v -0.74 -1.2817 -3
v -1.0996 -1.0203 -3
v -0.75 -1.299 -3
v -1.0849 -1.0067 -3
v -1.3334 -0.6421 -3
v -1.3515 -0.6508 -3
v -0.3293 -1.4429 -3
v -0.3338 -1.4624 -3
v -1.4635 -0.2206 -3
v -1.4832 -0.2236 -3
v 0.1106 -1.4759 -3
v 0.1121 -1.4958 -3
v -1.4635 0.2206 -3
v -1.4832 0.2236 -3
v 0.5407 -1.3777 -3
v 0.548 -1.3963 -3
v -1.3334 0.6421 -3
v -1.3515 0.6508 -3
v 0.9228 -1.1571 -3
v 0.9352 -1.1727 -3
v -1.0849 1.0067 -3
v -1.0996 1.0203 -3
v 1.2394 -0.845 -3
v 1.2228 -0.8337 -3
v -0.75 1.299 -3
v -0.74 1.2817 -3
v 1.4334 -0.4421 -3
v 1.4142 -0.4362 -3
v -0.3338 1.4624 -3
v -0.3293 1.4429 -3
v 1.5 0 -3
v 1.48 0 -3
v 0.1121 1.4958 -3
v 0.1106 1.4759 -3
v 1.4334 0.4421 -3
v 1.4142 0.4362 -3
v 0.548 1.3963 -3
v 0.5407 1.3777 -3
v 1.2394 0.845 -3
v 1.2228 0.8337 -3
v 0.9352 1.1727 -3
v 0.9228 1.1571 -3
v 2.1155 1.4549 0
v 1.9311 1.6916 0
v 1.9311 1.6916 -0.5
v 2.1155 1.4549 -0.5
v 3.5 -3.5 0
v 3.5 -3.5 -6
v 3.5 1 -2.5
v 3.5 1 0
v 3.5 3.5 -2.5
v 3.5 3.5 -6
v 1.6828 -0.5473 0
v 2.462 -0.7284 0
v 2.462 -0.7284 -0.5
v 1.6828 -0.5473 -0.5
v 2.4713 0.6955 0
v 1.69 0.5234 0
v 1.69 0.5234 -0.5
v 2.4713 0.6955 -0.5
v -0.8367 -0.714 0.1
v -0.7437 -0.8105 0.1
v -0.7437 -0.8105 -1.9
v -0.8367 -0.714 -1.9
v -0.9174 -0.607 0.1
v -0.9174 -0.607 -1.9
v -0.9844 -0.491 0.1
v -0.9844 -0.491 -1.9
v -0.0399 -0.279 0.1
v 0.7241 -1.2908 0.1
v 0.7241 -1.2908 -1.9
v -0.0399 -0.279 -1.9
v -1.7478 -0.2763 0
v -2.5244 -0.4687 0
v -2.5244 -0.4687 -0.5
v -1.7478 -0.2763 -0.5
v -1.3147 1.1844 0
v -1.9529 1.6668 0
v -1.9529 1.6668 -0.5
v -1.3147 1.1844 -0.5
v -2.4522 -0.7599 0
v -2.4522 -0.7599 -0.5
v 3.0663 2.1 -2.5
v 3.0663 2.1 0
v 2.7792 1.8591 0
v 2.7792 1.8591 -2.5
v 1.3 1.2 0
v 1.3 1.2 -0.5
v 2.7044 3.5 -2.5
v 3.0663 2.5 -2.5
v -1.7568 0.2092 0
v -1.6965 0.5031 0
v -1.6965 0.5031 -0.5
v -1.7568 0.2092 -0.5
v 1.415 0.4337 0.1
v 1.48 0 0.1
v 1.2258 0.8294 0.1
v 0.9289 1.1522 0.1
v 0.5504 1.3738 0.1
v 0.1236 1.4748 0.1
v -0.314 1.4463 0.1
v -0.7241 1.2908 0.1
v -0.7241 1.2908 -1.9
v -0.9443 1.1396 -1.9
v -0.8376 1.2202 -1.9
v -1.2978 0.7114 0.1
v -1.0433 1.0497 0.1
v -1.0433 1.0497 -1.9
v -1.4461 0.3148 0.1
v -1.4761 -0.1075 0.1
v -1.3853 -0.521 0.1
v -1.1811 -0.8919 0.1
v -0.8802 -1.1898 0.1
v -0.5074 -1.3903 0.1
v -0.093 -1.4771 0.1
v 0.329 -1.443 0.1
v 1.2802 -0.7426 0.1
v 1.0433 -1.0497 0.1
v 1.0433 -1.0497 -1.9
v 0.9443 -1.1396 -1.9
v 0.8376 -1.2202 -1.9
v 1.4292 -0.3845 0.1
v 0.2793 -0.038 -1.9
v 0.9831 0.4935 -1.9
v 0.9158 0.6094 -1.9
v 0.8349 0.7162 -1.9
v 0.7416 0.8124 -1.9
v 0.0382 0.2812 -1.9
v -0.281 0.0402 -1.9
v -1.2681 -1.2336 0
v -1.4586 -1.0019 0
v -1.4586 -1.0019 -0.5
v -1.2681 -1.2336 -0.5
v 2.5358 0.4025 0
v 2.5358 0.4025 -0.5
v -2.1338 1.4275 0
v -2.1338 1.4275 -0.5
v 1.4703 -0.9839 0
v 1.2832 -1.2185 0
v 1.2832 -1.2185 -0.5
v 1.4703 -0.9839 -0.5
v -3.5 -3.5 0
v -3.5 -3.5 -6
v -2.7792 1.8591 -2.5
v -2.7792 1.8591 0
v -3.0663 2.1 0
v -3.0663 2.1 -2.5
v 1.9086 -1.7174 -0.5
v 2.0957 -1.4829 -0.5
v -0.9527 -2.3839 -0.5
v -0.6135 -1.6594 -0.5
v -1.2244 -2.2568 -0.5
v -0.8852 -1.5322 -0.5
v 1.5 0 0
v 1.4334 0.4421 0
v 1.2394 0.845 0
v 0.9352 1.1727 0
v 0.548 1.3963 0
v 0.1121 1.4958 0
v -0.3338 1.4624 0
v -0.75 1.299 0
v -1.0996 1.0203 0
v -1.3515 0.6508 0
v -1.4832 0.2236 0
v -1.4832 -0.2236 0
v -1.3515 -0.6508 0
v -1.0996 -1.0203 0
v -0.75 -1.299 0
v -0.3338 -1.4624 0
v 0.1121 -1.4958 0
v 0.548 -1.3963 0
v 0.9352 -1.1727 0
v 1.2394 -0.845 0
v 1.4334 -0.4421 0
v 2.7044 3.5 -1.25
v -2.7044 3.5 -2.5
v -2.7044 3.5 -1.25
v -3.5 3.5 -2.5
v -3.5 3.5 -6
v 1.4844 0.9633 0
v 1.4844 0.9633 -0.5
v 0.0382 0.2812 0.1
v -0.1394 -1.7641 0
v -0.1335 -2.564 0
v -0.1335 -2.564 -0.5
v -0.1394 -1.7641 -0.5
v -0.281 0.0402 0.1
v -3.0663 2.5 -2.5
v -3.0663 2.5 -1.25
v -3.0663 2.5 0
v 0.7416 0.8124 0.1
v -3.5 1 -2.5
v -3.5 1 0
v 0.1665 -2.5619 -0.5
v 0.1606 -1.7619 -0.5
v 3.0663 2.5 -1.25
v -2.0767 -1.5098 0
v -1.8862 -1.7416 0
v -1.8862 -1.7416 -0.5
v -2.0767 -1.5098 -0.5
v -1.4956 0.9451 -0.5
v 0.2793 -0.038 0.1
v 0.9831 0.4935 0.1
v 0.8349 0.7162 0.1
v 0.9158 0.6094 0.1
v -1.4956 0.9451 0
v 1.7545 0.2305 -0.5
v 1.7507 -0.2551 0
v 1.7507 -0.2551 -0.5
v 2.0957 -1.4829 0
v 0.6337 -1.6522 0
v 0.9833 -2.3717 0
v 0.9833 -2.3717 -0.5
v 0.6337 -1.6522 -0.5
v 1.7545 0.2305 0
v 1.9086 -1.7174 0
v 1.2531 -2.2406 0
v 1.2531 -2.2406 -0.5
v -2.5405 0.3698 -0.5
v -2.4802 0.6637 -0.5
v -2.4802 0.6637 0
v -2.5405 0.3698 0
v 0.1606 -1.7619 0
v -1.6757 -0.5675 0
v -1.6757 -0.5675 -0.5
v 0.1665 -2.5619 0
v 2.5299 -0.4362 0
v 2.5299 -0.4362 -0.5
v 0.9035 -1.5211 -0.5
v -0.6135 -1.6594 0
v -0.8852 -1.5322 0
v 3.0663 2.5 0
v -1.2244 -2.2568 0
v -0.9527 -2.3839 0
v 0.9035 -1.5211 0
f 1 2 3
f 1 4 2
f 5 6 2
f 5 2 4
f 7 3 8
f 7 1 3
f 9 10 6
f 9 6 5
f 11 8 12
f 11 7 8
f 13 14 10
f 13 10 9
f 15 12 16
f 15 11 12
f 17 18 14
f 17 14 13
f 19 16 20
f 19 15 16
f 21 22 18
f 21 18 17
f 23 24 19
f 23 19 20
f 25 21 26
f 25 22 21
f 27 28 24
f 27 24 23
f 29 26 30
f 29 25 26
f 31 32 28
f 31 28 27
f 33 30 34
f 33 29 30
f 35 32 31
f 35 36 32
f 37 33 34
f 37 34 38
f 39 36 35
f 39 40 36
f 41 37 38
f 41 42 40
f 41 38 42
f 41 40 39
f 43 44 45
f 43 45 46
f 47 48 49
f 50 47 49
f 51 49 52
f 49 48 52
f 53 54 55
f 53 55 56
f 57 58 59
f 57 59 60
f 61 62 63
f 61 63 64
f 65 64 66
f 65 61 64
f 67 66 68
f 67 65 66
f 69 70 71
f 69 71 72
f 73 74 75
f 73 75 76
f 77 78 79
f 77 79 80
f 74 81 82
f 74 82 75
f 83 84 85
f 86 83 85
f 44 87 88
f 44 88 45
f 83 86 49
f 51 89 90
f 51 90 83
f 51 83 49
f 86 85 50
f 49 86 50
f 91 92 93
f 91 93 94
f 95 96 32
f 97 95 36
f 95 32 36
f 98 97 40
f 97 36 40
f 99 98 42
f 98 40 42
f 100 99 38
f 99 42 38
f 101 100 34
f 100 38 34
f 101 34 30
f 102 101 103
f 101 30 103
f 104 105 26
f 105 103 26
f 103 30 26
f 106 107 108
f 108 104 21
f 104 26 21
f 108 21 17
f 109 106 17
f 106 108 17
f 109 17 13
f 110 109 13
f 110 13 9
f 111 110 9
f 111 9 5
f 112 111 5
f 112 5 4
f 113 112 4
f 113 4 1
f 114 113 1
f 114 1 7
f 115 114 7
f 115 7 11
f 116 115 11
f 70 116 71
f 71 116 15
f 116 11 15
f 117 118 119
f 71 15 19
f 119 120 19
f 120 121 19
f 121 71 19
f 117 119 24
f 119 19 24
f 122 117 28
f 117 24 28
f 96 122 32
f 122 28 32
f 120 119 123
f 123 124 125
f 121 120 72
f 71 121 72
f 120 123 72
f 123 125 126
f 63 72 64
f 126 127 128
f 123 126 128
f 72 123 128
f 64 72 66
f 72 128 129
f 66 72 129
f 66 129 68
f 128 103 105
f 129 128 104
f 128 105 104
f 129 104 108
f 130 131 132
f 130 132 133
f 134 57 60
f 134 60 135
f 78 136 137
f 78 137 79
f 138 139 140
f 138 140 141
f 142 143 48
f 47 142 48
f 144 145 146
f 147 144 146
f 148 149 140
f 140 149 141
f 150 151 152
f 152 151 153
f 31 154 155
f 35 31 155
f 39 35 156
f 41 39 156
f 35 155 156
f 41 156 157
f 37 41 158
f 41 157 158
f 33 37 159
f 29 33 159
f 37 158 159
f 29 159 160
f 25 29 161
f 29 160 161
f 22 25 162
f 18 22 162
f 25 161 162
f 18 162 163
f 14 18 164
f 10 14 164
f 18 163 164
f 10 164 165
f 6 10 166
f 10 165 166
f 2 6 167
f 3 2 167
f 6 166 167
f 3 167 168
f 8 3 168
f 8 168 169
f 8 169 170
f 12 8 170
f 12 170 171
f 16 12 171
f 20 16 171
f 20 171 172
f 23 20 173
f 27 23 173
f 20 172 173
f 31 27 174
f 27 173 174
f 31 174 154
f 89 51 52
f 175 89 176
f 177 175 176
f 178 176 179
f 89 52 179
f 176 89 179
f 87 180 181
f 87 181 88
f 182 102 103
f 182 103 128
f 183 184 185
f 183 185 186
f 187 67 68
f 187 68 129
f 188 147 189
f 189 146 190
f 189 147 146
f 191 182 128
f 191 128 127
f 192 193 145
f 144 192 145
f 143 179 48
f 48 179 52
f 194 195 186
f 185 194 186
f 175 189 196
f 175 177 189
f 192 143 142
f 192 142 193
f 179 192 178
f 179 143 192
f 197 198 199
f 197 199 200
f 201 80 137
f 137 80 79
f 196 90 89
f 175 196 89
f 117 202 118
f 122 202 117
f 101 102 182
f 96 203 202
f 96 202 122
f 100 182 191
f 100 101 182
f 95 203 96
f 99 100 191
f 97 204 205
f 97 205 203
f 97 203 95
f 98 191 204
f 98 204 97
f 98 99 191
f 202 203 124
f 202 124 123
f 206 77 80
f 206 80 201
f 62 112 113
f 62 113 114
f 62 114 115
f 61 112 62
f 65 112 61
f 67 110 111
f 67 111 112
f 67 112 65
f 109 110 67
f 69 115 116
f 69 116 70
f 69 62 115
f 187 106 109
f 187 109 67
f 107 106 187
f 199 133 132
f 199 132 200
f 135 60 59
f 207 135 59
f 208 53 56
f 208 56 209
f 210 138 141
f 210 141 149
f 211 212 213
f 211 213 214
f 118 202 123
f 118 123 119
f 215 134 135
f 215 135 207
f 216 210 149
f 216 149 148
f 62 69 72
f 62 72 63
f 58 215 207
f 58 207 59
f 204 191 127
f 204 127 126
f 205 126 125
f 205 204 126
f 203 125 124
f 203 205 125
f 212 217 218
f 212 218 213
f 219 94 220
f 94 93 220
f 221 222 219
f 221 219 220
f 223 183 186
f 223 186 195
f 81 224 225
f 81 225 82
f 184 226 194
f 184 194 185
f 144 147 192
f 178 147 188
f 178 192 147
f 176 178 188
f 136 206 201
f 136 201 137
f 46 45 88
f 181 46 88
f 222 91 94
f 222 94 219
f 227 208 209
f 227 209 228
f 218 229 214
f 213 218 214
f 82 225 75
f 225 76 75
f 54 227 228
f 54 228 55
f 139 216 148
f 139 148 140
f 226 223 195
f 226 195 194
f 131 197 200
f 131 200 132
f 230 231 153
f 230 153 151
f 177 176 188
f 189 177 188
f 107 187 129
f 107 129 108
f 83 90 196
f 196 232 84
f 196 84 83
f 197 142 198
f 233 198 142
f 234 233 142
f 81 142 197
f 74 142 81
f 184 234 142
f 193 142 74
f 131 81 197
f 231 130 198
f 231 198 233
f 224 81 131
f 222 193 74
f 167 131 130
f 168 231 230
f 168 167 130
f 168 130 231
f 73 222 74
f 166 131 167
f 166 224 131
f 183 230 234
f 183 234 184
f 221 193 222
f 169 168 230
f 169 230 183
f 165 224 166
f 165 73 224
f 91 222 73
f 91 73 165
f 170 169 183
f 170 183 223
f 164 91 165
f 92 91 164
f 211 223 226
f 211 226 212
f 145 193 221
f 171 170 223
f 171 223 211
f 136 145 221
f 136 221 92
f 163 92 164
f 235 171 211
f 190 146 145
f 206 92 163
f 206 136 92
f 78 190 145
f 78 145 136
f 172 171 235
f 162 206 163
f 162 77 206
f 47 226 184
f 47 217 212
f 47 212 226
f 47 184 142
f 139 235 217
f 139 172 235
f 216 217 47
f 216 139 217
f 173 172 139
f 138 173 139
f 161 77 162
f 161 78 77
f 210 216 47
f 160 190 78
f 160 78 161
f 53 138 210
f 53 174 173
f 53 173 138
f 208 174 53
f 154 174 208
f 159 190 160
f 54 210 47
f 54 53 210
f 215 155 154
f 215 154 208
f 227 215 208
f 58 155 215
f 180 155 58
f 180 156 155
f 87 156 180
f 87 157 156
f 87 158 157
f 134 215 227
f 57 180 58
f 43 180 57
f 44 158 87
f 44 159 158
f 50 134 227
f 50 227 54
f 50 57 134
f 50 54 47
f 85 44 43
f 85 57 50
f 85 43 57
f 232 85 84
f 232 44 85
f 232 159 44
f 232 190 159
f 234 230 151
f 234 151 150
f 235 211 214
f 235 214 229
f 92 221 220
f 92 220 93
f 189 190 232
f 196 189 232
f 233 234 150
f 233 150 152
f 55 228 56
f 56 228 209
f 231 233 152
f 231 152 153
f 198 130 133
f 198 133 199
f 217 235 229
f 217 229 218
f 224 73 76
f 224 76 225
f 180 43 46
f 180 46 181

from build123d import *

# Parameters (mm, degrees)
BASE_EXTRUDE_START  = -6
SKETCH1_W           = 7
SKETCH1_H           = 7
BASE_EXTRUDE_DEPTH  = 6
SKETCH2_R           = 1.5
CUT_EXTRUDE1_DEPTH  = 3
SKETCH3_R           = 1.48
BOSS_EXTRUDE1_DEPTH = 3.1
CUT_EXTRUDE2_DEPTH  = 2
CUT_EXTRUDE3_DEPTH  = 0.5
CUT_EXTRUDE4_DEPTH  = 2.5
BOSS_EXTRUDE2_DEPTH = 1.25


with BuildPart() as part:
    # Sketch1 → Base-Extrude (new body)
    with BuildSketch(Plane.XY.offset(BASE_EXTRUDE_START)):
        Rectangle(SKETCH1_W, SKETCH1_H)
    extrude(amount=BASE_EXTRUDE_DEPTH)

    # Sketch2 → Cut-Extrude1 (cut)
    with BuildSketch(Plane.XY):
        Circle(SKETCH2_R)
    extrude(amount=-CUT_EXTRUDE1_DEPTH, mode=Mode.SUBTRACT)

    # Sketch3 → Boss-Extrude1 (add)
    with BuildSketch(Plane.XY.offset(-3)):
        Circle(SKETCH3_R)
    extrude(amount=BOSS_EXTRUDE1_DEPTH)

    # Sketch4 → Cut-Extrude2 (cut)
    with BuildSketch(Plane.XY.offset(0.1)):
        with BuildLine():
            Line((0.724096874, -1.290768654), (-0.039924426, -0.279012083))
            Line((-0.039924426, -0.279012083), (-0.743721804, -0.81048003))
            ThreePointArc((-0.743721804, -0.81048003), (-0.87868568, -0.661748801), (-0.984357933, -0.490957696))
            Line((-0.984357933, -0.490957696), (-0.280973901, 0.040198115))
            Line((-0.280973901, 0.040198115), (-1.043307072, 1.049719178))
            ThreePointArc((-1.043307072, 1.049719178), (-0.891883058, 1.181077733), (-0.724096874, 1.290768654))
            Line((-0.724096874, 1.290768654), (0.038236297, 0.28124759))
            Line((0.038236297, 0.28124759), (0.741620329, 0.812403402))
            ThreePointArc((0.741620329, 0.812403402), (0.876968937, 0.664022201), (0.98308315, 0.493505339))
            Line((0.98308315, 0.493505339), (0.279285772, -0.037962608))
            Line((0.279285772, -0.037962608), (1.043307072, -1.049719178))
            ThreePointArc((1.043307072, -1.049719178), (0.891883058, -1.181077733), (0.724096874, -1.290768654))
        make_face()
    extrude(amount=-CUT_EXTRUDE2_DEPTH, mode=Mode.SUBTRACT)

    # Sketch5 → Cut-Extrude3 (cut)
    with BuildSketch(Plane.XY):
        Polygon((1.3, 1.2), (1.931123884, 1.691612289), (2.115478493, 1.454940832), (1.484354608, 0.963328543), align=None)
        Polygon((1.689974186, 0.523437915), (2.471261862, 0.695454097), (2.53576793, 0.402471219), (1.754480254, 0.230455037), align=None)
        Polygon((1.750691662, -0.255105281), (2.529925297, -0.436199021), (2.462015144, -0.728411634), (1.68278151, -0.547317894), align=None)
        Polygon((1.470322877, -0.98394646), (2.095684825, -1.482867731), (1.908589348, -1.717378462), (1.283227401, -1.21845719), align=None)
        Polygon((0.903491923, -1.52108591), (1.25314327, -2.240630165), (0.983314174, -2.371749421), (0.633662827, -1.652205165), align=None)
        Polygon((0.160634151, -1.761873057), (0.166452524, -2.561851898), (-0.133539541, -2.564033789), (-0.139357915, -1.764054947), align=None)
        Polygon((-0.613519882, -1.659395479), (-0.952668072, -2.383949483), (-1.224375823, -2.256768912), (-0.885227633, -1.532214907), align=None)
        Polygon((-1.268142184, -1.233618823), (-1.886180889, -1.741583546), (-2.07666766, -1.509819032), (-1.458628956, -1.001854309), align=None)
        Polygon((-1.675693067, -0.567496913), (-2.452210156, -0.759905877), (-2.524363518, -0.468711968), (-1.747846428, -0.276303004), align=None)
        Polygon((-1.756769622, 0.209190097), (-2.540476714, 0.369823822), (-2.480239067, 0.663713982), (-1.696531975, 0.503080257), align=None)
        Polygon((-1.49557575, 0.94512072), (-2.133783638, 1.427500956), (-1.952891049, 1.666828914), (-1.314683162, 1.184448678), align=None)
    extrude(amount=-CUT_EXTRUDE3_DEPTH, mode=Mode.SUBTRACT)

    # Sketch7 → Cut-Extrude4 (cut)
    with BuildSketch(Plane.XY):
        Polygon((3.5, 3.5), (-3.5, 3.5), (-3.5, 1), (-2.779166508, 1.859055904), (-3.066312501, 2.1), (-3.066312501, 2.5), (3.066312501, 2.5), (3.066312501, 2.1), (2.779166508, 1.859055904), (3.5, 1), align=None)
    extrude(amount=-CUT_EXTRUDE4_DEPTH, mode=Mode.SUBTRACT)

    # Sketch8 → Boss-Extrude2 (add)
    with BuildSketch(Plane.XY.offset(-2.5)):
        Polygon((-3.066312501, 2.5), (3.066312501, 2.5), (2.70444426, 3.5), (-2.70444426, 3.5), align=None)
    extrude(amount=BOSS_EXTRUDE2_DEPTH)


solid = part.part
